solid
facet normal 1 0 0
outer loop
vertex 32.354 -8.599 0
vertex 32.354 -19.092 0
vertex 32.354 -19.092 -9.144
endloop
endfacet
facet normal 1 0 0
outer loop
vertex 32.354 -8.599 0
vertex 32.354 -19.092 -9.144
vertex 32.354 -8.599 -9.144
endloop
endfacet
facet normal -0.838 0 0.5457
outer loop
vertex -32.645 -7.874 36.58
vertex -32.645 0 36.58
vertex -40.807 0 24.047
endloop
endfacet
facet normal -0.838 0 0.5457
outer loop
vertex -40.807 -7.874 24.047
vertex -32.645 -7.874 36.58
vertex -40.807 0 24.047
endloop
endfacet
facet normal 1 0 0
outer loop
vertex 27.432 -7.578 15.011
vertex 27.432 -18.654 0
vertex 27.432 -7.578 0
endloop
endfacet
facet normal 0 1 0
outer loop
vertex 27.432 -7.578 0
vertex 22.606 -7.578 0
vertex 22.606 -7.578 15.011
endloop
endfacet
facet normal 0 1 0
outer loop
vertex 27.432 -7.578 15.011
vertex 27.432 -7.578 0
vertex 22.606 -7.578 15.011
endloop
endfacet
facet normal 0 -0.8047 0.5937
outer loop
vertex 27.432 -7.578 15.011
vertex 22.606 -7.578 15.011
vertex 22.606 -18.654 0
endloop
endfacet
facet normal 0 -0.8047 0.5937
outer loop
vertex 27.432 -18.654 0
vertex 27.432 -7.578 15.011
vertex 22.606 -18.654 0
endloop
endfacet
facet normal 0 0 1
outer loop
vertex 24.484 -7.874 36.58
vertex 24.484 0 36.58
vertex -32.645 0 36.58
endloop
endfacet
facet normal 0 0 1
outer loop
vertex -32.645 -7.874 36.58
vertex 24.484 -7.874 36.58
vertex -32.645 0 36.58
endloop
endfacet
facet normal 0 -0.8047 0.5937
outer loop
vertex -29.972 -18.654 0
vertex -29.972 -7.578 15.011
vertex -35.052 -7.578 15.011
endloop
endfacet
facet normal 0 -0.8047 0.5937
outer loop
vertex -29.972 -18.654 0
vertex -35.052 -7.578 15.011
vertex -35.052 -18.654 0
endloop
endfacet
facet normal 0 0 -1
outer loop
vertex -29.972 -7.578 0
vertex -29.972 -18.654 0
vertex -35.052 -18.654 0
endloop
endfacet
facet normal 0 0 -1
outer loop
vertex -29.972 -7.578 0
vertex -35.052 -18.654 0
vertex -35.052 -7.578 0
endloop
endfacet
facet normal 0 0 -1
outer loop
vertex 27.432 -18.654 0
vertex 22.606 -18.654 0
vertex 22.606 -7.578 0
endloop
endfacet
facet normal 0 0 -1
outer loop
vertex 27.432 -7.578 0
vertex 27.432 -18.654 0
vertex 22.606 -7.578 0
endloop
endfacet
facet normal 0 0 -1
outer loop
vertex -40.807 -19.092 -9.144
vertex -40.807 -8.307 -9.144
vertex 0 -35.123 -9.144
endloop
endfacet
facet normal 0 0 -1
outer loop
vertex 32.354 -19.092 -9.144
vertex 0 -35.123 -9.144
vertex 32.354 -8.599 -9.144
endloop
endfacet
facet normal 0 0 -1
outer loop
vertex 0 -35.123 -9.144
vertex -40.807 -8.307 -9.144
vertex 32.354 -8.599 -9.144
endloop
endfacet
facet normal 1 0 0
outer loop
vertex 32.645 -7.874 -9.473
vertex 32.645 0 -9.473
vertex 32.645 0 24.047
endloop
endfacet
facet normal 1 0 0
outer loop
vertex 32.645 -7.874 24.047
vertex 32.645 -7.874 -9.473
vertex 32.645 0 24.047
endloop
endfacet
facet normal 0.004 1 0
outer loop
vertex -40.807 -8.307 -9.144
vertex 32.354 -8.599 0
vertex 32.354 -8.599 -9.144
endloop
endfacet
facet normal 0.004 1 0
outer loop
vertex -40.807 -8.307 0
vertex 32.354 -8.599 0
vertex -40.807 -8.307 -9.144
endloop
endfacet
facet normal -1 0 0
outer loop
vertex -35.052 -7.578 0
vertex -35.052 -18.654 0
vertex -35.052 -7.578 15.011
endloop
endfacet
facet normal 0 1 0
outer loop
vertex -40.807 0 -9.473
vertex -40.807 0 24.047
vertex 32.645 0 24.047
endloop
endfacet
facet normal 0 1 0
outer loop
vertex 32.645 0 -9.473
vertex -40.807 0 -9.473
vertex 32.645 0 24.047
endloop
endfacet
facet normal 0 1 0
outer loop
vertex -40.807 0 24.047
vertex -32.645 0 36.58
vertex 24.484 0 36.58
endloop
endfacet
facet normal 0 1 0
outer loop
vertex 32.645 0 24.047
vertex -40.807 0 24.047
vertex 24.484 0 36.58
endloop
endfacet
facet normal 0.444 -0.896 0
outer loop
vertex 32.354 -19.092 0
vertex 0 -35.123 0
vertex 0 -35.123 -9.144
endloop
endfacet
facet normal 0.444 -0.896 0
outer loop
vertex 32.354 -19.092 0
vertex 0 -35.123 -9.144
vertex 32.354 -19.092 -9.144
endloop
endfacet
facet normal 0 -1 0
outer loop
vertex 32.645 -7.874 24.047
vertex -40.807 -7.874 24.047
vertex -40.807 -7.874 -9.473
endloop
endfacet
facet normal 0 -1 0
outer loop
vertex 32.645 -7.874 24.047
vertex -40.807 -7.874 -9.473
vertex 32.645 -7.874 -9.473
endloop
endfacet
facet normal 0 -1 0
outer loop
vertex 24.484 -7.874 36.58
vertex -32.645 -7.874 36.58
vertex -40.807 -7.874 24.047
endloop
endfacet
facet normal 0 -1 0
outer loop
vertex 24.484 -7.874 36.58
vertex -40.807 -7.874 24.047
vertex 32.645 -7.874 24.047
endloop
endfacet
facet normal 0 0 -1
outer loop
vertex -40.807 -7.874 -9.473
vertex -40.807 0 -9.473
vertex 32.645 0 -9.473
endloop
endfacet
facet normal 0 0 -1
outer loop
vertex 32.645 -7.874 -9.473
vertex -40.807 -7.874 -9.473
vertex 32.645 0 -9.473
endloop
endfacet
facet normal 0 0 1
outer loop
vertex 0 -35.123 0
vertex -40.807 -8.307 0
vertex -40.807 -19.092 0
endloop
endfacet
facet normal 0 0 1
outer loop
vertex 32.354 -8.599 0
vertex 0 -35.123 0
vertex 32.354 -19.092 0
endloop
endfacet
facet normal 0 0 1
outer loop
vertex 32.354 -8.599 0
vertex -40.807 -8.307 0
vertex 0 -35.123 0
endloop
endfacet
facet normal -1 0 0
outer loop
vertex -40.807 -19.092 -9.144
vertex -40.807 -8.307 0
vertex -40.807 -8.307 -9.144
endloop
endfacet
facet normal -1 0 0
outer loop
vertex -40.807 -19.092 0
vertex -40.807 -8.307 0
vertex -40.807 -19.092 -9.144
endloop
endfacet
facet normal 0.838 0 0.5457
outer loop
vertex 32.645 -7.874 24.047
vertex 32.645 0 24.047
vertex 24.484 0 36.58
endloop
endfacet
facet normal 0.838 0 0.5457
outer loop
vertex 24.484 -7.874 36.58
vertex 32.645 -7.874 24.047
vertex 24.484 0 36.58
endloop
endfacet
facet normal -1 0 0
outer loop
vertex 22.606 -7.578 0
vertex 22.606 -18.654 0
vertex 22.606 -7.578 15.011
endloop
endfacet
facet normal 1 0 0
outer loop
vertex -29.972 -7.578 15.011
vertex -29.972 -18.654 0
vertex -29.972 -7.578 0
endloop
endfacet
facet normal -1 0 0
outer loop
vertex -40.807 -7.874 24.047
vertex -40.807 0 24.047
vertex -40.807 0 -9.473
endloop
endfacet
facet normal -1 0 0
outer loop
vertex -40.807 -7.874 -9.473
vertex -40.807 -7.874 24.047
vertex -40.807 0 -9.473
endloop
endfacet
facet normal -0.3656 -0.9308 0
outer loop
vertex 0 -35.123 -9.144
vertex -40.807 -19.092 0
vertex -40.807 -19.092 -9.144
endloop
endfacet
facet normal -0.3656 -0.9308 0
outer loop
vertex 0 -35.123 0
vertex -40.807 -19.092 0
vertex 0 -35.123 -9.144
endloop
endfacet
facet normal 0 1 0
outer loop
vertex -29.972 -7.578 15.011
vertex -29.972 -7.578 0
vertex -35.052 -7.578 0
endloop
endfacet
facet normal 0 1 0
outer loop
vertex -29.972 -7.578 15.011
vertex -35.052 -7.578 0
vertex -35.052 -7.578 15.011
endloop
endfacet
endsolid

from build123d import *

# Parameters (mm, degrees)
F1_DEPTH = 7.874
F3_DEPTH = 9.144
F5_DEPTH = 27.432
F6_DEPTH = 22.606
F7_DEPTH = 35.052
F8_DEPTH = 29.972


with BuildPart() as f1:
    # F0 (on Front) → F1 (new body)
    with BuildSketch(Plane.XZ):
        Polygon((24.4839340448, 36.5801639855), (-32.6452478766, 36.5801639855), (-40.8065579832, 24.0467209369), (-40.8065579832, -9.472951293), (32.6452441514, -9.472951293), (32.6452441514, 24.0467209369), align=None)
    extrude(amount=F1_DEPTH)


with BuildPart() as f3:
    # F2 (on Top) → F3 (new body)
    with BuildSketch(Plane.XY):
        Polygon((32.3537737131, -8.5985241458), (-40.8065579832, -8.3070490509), (-40.8065579832, -19.0916396677), (0, -35.1227857172), (32.3537737131, -19.0916396677), align=None)
    extrude(amount=-F3_DEPTH)


with BuildPart() as f5:
    # F4 (on Right) → F5 (new body)
    with BuildSketch(Plane.YZ):
        Polygon((-18.6544265598, 0), (-7.5783613138, 0), (-7.5783613138, 15.0109836832), align=None)
    extrude(amount=F5_DEPTH)

    # F6 (cut): a face of the model
    f6_faces = [f5.faces().sort_by_distance(p)[0] for p in [
        (0, -11.2703830625, 5.0036612277),
    ]]
    extrude(f6_faces, amount=-F6_DEPTH, mode=Mode.SUBTRACT)


with BuildPart() as f7:
    # F4 (on Right) → F7 (new body)
    with BuildSketch(Plane.YZ):
        Polygon((-18.6544265598, 0), (-7.5783613138, 0), (-7.5783613138, 15.0109836832), align=None)
    extrude(amount=-F7_DEPTH)

    # F8 (cut): a face of the model
    f8_faces = [f7.faces().sort_by_distance(p)[0] for p in [
        (0, -11.2703830625, 5.0036612277),
    ]]
    extrude(f8_faces, amount=-F8_DEPTH, mode=Mode.SUBTRACT)


solid = Compound([f1.part, f3.part, f5.part, f7.part])
